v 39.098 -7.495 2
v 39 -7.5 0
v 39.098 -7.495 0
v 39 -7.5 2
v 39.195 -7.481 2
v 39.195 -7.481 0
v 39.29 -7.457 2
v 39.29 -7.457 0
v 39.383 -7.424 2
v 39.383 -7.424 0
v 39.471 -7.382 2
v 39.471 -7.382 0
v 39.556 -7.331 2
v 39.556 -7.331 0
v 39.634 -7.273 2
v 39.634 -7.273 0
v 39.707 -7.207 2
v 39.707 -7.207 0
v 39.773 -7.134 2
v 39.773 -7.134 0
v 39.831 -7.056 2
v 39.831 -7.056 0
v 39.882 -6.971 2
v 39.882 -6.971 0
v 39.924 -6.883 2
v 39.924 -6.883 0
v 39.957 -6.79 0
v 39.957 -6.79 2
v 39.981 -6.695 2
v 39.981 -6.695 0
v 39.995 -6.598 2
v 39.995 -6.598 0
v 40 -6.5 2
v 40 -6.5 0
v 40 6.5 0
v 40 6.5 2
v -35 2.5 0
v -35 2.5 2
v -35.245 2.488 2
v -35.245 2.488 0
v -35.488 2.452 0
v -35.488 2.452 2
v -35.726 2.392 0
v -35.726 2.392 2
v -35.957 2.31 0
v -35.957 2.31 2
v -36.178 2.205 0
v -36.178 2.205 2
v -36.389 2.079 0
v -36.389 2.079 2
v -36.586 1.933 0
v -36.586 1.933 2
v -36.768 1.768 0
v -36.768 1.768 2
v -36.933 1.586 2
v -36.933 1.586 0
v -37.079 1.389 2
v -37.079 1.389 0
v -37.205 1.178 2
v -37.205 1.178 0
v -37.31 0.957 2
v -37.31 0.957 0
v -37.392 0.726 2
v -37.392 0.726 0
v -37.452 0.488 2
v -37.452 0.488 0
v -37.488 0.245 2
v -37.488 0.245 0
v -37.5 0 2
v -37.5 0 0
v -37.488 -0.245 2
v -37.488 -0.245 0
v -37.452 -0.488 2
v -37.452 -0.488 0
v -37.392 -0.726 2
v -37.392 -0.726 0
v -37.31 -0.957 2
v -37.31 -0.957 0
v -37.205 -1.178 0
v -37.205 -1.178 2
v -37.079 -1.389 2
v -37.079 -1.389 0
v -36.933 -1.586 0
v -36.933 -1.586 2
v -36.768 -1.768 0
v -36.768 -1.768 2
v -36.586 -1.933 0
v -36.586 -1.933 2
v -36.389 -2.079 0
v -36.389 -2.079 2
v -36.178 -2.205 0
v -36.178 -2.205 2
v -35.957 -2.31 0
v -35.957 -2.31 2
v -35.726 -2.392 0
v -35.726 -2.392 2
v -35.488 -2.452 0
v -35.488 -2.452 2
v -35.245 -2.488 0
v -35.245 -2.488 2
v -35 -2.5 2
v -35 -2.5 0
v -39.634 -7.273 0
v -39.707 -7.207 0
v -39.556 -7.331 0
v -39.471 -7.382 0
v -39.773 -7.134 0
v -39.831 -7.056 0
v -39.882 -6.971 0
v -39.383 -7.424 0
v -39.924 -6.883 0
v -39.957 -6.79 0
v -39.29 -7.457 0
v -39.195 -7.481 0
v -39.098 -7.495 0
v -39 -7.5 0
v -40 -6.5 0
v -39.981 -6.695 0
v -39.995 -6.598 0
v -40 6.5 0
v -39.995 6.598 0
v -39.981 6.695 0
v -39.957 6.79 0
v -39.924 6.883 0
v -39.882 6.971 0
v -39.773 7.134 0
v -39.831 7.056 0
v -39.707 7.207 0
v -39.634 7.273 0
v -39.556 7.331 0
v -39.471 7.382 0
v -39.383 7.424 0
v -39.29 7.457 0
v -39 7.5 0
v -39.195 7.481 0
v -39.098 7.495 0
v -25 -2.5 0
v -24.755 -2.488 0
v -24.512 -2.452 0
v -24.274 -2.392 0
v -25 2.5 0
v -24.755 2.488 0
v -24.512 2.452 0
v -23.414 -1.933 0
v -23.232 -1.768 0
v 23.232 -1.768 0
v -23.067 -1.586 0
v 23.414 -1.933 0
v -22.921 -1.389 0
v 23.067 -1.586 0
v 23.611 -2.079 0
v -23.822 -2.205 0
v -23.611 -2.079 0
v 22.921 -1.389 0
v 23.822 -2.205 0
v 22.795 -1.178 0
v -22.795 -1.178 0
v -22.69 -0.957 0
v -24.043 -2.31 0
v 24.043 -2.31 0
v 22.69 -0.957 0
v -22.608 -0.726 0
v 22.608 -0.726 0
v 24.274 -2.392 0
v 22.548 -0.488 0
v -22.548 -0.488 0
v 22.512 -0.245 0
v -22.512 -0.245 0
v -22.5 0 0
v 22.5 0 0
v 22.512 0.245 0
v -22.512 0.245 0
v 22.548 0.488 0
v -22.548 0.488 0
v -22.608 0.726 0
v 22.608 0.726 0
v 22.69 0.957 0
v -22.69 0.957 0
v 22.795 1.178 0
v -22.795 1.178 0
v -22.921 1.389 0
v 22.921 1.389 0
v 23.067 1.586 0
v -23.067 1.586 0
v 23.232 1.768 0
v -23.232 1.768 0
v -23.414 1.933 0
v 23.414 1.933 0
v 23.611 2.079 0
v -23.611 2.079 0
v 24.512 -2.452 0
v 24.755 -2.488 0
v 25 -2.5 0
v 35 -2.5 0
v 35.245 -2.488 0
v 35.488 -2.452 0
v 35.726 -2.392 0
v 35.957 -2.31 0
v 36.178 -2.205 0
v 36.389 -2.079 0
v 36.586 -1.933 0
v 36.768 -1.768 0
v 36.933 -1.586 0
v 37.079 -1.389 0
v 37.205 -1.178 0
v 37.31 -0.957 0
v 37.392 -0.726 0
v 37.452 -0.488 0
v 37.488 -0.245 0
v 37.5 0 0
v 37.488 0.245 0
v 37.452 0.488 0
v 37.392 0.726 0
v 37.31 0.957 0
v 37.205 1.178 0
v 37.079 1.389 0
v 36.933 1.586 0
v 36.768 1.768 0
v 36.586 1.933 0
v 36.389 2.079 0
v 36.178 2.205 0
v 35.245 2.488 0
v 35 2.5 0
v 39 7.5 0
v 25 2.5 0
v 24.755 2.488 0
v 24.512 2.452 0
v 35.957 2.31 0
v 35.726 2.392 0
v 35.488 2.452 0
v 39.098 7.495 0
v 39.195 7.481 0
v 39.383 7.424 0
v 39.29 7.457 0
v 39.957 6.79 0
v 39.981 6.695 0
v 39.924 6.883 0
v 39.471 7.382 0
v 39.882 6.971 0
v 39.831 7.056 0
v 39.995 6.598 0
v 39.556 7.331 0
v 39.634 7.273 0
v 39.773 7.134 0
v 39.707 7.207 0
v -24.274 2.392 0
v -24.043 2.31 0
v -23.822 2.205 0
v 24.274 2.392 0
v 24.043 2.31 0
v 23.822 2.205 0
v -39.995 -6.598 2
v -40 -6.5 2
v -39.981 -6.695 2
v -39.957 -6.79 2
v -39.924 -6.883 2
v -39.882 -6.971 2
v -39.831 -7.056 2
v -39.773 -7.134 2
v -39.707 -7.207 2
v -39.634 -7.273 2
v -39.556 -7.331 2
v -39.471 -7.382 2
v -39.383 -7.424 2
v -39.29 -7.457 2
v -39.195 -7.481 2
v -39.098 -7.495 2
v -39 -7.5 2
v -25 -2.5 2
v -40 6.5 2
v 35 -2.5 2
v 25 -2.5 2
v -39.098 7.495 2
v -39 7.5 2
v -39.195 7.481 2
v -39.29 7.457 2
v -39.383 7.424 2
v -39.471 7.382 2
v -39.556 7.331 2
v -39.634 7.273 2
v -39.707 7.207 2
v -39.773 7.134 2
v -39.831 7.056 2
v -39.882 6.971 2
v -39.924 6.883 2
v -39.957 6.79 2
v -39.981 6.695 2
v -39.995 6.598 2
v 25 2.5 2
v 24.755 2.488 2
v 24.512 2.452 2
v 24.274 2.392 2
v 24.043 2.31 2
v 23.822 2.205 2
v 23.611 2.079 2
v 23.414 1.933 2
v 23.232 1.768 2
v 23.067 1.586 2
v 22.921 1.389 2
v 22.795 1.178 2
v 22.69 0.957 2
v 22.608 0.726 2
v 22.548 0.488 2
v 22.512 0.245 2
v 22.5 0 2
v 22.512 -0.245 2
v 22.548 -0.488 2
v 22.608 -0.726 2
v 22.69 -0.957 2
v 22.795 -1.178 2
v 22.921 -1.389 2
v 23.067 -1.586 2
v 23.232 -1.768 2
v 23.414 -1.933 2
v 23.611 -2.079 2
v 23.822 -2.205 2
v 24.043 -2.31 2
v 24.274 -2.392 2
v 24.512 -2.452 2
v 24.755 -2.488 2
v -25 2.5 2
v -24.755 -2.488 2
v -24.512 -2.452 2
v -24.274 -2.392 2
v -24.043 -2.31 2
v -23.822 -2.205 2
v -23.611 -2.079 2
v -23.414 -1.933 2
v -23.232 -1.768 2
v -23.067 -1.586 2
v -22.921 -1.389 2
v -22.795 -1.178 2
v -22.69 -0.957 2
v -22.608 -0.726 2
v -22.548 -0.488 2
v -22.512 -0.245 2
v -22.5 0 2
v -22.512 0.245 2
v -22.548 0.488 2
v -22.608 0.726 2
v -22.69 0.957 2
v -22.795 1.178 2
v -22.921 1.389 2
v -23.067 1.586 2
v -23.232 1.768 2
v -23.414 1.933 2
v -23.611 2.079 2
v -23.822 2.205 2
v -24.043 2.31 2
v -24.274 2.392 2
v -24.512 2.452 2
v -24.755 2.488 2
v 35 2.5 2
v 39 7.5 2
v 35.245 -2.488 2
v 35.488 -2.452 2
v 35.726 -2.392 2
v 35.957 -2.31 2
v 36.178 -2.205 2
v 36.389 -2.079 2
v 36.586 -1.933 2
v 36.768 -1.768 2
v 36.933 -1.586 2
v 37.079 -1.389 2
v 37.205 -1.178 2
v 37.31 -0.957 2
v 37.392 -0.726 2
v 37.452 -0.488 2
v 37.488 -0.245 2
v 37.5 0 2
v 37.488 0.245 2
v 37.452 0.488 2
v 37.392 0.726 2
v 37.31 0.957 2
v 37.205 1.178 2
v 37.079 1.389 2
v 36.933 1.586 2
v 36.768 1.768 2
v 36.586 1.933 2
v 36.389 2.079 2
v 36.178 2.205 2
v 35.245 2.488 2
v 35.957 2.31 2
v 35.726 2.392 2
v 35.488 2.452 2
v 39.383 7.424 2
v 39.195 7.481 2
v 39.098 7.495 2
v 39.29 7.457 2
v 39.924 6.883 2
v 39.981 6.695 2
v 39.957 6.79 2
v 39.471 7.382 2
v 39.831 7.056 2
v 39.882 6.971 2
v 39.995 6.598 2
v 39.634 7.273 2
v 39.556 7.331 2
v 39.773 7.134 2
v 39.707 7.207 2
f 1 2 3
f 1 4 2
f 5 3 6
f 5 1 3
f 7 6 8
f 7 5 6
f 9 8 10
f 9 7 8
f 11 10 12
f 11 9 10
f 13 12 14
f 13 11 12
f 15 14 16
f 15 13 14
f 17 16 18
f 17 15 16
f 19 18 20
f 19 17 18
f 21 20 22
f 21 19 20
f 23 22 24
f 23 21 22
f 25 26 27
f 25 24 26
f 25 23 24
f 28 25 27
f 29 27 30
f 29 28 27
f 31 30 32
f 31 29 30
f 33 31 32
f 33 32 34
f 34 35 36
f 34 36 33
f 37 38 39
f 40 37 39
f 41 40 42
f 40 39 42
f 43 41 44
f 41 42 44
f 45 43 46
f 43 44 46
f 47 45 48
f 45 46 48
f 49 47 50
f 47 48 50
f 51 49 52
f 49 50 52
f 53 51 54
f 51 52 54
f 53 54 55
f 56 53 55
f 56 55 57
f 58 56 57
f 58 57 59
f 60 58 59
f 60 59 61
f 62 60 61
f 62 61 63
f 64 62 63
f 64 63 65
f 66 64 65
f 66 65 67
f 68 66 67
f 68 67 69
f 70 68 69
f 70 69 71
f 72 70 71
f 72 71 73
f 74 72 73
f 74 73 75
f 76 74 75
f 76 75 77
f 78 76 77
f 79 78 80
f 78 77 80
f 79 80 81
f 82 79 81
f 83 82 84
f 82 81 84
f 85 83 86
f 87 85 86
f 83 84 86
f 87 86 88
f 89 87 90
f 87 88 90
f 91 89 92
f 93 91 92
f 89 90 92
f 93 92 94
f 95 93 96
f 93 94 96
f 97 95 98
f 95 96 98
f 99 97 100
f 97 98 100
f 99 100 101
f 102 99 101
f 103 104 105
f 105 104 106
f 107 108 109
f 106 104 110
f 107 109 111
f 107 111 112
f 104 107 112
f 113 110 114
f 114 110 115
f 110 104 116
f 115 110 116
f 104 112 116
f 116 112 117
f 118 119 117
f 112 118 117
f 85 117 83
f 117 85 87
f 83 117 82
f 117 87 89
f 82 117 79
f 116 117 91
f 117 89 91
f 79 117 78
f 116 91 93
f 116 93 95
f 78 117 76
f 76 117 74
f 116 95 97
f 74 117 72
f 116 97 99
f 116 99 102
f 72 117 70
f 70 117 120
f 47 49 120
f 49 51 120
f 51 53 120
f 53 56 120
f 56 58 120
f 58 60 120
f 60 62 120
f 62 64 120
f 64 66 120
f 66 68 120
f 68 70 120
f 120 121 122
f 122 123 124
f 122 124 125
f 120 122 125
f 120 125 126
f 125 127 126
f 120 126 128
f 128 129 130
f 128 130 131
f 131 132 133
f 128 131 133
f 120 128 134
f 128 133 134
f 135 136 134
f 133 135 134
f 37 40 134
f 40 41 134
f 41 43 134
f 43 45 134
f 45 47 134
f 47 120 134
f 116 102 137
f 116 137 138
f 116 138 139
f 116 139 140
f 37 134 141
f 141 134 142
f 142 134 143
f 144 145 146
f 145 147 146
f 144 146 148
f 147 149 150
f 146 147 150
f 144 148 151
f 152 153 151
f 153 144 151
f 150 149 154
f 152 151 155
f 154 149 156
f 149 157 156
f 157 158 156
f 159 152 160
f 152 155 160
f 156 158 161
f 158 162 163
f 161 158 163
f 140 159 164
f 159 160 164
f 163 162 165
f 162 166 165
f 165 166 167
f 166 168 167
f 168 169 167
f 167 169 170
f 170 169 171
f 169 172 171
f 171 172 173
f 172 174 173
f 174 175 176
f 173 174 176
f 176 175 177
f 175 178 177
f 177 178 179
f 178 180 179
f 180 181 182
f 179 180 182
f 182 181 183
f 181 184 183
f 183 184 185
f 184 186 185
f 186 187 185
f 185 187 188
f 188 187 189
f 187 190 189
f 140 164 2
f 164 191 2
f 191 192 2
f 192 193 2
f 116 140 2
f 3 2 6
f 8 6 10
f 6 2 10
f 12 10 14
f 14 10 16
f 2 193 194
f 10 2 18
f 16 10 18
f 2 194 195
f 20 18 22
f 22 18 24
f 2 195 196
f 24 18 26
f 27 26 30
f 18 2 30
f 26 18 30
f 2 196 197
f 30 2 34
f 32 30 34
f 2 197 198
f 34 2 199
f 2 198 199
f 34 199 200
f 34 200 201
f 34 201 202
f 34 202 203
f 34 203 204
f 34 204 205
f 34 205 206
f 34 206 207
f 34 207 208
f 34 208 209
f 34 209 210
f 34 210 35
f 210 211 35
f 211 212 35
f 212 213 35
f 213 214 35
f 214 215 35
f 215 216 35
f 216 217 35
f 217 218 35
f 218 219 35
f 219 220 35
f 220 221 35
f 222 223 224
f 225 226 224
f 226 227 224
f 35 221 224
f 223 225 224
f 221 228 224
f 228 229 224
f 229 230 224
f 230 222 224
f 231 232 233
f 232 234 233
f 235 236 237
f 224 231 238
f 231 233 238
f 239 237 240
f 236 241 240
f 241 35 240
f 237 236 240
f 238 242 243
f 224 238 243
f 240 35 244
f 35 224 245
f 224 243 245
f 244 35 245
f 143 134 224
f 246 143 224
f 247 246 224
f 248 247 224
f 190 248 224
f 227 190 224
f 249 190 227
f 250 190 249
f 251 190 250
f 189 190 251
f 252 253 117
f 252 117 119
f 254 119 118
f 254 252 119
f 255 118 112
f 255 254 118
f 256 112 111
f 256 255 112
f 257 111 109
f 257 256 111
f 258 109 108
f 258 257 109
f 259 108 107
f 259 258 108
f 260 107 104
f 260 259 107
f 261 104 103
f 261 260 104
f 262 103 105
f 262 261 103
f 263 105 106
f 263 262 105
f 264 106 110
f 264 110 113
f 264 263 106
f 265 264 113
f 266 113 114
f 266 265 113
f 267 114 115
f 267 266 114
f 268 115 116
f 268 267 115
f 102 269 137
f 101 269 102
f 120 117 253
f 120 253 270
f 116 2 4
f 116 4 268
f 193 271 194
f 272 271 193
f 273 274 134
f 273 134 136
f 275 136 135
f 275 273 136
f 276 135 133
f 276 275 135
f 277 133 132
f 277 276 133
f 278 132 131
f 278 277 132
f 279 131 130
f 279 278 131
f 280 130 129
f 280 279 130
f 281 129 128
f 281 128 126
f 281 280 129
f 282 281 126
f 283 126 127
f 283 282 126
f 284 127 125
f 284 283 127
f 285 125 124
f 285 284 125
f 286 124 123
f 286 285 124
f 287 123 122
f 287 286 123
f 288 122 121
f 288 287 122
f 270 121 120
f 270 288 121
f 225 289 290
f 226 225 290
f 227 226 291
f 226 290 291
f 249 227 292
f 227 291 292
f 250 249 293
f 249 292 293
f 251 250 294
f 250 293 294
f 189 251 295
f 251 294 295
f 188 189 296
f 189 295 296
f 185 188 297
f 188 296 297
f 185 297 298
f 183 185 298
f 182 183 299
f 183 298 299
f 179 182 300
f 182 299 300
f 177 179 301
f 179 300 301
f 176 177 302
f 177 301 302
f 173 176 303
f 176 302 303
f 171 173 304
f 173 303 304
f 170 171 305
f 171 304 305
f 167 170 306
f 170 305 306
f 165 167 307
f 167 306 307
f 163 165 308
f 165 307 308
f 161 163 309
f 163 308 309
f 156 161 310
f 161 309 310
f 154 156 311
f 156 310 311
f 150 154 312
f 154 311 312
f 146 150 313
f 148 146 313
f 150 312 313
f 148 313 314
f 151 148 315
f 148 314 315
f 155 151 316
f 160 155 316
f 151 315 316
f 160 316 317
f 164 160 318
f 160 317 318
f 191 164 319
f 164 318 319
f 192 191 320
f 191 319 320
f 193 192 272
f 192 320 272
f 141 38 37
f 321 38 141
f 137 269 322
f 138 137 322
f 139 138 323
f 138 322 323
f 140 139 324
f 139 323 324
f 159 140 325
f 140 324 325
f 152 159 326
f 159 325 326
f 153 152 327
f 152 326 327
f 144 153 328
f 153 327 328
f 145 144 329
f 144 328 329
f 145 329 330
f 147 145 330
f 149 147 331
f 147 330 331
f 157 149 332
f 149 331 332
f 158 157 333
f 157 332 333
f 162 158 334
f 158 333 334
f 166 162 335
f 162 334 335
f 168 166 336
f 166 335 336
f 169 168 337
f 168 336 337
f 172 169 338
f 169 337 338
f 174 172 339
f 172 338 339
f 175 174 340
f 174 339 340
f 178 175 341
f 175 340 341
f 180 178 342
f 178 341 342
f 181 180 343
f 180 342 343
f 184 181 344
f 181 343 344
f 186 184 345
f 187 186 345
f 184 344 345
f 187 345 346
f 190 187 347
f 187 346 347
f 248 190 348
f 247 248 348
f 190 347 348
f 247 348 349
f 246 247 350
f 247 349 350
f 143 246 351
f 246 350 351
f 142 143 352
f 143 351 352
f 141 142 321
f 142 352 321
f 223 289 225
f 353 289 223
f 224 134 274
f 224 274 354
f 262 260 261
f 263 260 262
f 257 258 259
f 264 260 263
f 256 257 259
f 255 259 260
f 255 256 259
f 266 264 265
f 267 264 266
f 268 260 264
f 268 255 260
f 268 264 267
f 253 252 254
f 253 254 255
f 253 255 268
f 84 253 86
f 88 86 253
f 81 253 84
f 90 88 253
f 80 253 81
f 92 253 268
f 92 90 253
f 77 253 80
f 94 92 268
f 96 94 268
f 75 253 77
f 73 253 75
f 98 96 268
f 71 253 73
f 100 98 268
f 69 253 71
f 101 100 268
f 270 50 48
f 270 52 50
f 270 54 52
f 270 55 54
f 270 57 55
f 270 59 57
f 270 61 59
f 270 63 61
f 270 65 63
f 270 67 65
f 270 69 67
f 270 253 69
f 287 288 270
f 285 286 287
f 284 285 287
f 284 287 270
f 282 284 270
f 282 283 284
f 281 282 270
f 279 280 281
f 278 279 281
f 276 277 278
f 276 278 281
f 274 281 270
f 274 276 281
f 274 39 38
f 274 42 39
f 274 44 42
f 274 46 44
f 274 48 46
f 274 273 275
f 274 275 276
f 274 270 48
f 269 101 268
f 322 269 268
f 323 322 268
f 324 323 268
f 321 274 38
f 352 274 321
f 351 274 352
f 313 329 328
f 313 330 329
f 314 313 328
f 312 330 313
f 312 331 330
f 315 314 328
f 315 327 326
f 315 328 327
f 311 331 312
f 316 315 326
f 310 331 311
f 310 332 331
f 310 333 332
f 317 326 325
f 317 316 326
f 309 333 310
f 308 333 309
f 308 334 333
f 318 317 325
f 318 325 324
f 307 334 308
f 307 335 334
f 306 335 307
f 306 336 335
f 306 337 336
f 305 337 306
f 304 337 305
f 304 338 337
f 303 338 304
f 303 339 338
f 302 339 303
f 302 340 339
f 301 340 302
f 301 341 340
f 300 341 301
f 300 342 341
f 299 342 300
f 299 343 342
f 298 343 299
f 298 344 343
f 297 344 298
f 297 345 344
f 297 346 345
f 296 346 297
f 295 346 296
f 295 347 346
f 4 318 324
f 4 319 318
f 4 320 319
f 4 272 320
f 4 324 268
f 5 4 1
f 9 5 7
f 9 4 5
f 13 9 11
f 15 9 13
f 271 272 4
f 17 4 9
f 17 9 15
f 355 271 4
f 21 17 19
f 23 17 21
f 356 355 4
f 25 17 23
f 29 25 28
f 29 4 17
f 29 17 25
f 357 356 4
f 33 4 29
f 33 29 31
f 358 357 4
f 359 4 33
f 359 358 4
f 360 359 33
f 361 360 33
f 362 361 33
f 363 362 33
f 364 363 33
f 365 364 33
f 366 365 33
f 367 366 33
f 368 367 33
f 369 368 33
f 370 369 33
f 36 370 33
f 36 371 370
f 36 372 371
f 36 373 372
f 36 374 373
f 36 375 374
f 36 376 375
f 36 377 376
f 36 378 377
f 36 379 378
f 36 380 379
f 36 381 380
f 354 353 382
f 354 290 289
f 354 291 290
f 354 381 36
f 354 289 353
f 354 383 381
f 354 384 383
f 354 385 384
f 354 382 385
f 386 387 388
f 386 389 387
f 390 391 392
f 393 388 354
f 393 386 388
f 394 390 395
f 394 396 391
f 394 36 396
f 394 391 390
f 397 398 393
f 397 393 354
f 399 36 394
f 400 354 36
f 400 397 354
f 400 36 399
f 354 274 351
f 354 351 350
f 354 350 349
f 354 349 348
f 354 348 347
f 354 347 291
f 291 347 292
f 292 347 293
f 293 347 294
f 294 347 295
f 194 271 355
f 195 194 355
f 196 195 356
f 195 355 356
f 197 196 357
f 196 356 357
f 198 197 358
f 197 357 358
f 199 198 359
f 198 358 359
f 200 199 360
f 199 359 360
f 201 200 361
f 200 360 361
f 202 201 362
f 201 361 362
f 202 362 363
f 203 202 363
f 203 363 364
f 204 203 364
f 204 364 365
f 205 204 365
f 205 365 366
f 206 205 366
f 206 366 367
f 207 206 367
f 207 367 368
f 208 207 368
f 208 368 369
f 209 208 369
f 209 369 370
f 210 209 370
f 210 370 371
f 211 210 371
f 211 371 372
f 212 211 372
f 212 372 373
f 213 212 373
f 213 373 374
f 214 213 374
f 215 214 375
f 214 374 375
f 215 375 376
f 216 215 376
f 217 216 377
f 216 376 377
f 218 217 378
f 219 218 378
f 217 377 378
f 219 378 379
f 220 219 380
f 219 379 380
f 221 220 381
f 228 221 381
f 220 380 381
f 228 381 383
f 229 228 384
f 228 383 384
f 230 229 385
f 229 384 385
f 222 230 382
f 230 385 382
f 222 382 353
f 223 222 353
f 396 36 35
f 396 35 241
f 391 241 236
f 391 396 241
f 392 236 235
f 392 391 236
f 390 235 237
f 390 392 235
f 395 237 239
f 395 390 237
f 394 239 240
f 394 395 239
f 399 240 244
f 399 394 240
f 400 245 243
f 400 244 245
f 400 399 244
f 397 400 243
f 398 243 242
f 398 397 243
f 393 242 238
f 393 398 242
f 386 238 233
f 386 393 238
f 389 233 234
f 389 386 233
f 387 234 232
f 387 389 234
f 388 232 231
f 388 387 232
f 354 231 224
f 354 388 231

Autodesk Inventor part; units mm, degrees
ref_plane "YZ Plane" through (0, 0, 0) normal (1, 0, 0) x (0, 1, 0)
ref_plane "XZ Plane" through (0, 0, 0) normal (0, 1, 0) x (-1, 0, 0)
ref_plane "XY Plane" through (0, 0, 0) normal (0, 0, 1) x (1, 0, 0)
sketch "Sketch1" plane through (0, 0, 0) normal (0, 0, 1) x (1, 0, 0)
  line L0 (-40, 7.5) -> (40, 7.5)
  line L1 (40, 7.5) -> (40, -7.5)
  line L2 (40, -7.5) -> (-40, -7.5)
  line L3 (-40, -7.5) -> (-40, 7.5)
  point P0 (0, 0)
  dimension "d0" = 80
  dimension "d1" = 15
  dimension "d2" = 40
  dimension "d3" = 7.5
extrude "Extrusion1" add sketch "Sketch1" along normal blind 2
sketch "Sketch2" plane through (0, 0, 2) normal (0, 0, 1) x (1, 0, 0)
  line L0 (-40, 7.5) -> (40, 7.5) projected
  line L1 (-40, -7.5) -> (-40, 7.5) projected
  arc A0 (-35, 2.5) -> (-35, -2.5) centre (-35, 0) ccw
  arc A1 (-25, -2.5) -> (-25, 2.5) centre (-25, 0) ccw
  line L2 (-35, 2.5) -> (-25, 2.5)
  line L3 (-25, -2.5) -> (-35, -2.5)
  arc A2 (25, 2.5) -> (25, -2.5) centre (25, 0) ccw
  arc A3 (35, -2.5) -> (35, 2.5) centre (35, 0) ccw
  line L4 (25, 2.5) -> (35, 2.5)
  line L5 (35, -2.5) -> (25, -2.5)
  point P0 (0, 0)
  dimension "d6" = 5
  dimension "d7" = 5
  dimension "d8" = 10
  dimension "d9" = 5
  dimension "d10" = 7.5
  dimension "d11" = 7.5
  dimension "d12" = 5
  dimension "d15" = 60
extrude "Extrusion2" cut sketch "Sketch2" against normal through all
fillet "Fillet1" radius 1 4 edges at (-40, 7.5, 1) (-40, -7.5, 1) (40, -7.5, 1) (40, 7.5, 1)
equation "\"d2\" = 0.5 * d0"
equation "\"d3\" = 0.5 * d1"
properties part number "SM-TM2" material "UHMW, White"
